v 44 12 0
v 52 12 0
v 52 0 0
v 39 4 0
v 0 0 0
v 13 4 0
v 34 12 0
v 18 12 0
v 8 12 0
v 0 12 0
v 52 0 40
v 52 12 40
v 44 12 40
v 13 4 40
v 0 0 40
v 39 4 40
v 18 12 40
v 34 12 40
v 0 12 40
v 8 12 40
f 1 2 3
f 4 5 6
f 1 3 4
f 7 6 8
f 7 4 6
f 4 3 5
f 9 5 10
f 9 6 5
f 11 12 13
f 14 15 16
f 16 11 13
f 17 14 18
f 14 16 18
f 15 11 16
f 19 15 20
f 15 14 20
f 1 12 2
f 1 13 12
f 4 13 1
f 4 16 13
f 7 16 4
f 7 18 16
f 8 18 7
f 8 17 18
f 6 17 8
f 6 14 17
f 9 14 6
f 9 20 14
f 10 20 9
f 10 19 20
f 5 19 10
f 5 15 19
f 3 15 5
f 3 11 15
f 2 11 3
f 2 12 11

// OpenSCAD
$fn = 32;

// ----------------------------------------------------------------------
// V guide rail: doublev, 52 mm wide
// ----------------------------------------------------------------------

// --- parameters (mm) ---
rail_w = 52;              // rail width, X
base_t = 12;              // base plate thickness
v_depth = 8;              // V feature depth / height
v_half_w = 10;            // half width of the V at the base face
plate_t = 40;             // rail length, Z (the extrusion height)
groove_off = 13;          // offset of each groove from the centreline

centre_x = rail_w / 2;  // rail centreline
groove_a = centre_x - groove_off;  // axis of the first groove
groove_b = centre_x + groove_off;  // axis of the second groove

profile = [[0, 0], [52, 0], [52, 12], [44, 12], [39, 4], [34, 12], [18, 12], [13, 4], [8, 12], [0, 12]];  // primary outline, 10 points, counter clockwise

// --- the one profile operation ---
linear_extrude(height = plate_t) polygon(points = profile);
